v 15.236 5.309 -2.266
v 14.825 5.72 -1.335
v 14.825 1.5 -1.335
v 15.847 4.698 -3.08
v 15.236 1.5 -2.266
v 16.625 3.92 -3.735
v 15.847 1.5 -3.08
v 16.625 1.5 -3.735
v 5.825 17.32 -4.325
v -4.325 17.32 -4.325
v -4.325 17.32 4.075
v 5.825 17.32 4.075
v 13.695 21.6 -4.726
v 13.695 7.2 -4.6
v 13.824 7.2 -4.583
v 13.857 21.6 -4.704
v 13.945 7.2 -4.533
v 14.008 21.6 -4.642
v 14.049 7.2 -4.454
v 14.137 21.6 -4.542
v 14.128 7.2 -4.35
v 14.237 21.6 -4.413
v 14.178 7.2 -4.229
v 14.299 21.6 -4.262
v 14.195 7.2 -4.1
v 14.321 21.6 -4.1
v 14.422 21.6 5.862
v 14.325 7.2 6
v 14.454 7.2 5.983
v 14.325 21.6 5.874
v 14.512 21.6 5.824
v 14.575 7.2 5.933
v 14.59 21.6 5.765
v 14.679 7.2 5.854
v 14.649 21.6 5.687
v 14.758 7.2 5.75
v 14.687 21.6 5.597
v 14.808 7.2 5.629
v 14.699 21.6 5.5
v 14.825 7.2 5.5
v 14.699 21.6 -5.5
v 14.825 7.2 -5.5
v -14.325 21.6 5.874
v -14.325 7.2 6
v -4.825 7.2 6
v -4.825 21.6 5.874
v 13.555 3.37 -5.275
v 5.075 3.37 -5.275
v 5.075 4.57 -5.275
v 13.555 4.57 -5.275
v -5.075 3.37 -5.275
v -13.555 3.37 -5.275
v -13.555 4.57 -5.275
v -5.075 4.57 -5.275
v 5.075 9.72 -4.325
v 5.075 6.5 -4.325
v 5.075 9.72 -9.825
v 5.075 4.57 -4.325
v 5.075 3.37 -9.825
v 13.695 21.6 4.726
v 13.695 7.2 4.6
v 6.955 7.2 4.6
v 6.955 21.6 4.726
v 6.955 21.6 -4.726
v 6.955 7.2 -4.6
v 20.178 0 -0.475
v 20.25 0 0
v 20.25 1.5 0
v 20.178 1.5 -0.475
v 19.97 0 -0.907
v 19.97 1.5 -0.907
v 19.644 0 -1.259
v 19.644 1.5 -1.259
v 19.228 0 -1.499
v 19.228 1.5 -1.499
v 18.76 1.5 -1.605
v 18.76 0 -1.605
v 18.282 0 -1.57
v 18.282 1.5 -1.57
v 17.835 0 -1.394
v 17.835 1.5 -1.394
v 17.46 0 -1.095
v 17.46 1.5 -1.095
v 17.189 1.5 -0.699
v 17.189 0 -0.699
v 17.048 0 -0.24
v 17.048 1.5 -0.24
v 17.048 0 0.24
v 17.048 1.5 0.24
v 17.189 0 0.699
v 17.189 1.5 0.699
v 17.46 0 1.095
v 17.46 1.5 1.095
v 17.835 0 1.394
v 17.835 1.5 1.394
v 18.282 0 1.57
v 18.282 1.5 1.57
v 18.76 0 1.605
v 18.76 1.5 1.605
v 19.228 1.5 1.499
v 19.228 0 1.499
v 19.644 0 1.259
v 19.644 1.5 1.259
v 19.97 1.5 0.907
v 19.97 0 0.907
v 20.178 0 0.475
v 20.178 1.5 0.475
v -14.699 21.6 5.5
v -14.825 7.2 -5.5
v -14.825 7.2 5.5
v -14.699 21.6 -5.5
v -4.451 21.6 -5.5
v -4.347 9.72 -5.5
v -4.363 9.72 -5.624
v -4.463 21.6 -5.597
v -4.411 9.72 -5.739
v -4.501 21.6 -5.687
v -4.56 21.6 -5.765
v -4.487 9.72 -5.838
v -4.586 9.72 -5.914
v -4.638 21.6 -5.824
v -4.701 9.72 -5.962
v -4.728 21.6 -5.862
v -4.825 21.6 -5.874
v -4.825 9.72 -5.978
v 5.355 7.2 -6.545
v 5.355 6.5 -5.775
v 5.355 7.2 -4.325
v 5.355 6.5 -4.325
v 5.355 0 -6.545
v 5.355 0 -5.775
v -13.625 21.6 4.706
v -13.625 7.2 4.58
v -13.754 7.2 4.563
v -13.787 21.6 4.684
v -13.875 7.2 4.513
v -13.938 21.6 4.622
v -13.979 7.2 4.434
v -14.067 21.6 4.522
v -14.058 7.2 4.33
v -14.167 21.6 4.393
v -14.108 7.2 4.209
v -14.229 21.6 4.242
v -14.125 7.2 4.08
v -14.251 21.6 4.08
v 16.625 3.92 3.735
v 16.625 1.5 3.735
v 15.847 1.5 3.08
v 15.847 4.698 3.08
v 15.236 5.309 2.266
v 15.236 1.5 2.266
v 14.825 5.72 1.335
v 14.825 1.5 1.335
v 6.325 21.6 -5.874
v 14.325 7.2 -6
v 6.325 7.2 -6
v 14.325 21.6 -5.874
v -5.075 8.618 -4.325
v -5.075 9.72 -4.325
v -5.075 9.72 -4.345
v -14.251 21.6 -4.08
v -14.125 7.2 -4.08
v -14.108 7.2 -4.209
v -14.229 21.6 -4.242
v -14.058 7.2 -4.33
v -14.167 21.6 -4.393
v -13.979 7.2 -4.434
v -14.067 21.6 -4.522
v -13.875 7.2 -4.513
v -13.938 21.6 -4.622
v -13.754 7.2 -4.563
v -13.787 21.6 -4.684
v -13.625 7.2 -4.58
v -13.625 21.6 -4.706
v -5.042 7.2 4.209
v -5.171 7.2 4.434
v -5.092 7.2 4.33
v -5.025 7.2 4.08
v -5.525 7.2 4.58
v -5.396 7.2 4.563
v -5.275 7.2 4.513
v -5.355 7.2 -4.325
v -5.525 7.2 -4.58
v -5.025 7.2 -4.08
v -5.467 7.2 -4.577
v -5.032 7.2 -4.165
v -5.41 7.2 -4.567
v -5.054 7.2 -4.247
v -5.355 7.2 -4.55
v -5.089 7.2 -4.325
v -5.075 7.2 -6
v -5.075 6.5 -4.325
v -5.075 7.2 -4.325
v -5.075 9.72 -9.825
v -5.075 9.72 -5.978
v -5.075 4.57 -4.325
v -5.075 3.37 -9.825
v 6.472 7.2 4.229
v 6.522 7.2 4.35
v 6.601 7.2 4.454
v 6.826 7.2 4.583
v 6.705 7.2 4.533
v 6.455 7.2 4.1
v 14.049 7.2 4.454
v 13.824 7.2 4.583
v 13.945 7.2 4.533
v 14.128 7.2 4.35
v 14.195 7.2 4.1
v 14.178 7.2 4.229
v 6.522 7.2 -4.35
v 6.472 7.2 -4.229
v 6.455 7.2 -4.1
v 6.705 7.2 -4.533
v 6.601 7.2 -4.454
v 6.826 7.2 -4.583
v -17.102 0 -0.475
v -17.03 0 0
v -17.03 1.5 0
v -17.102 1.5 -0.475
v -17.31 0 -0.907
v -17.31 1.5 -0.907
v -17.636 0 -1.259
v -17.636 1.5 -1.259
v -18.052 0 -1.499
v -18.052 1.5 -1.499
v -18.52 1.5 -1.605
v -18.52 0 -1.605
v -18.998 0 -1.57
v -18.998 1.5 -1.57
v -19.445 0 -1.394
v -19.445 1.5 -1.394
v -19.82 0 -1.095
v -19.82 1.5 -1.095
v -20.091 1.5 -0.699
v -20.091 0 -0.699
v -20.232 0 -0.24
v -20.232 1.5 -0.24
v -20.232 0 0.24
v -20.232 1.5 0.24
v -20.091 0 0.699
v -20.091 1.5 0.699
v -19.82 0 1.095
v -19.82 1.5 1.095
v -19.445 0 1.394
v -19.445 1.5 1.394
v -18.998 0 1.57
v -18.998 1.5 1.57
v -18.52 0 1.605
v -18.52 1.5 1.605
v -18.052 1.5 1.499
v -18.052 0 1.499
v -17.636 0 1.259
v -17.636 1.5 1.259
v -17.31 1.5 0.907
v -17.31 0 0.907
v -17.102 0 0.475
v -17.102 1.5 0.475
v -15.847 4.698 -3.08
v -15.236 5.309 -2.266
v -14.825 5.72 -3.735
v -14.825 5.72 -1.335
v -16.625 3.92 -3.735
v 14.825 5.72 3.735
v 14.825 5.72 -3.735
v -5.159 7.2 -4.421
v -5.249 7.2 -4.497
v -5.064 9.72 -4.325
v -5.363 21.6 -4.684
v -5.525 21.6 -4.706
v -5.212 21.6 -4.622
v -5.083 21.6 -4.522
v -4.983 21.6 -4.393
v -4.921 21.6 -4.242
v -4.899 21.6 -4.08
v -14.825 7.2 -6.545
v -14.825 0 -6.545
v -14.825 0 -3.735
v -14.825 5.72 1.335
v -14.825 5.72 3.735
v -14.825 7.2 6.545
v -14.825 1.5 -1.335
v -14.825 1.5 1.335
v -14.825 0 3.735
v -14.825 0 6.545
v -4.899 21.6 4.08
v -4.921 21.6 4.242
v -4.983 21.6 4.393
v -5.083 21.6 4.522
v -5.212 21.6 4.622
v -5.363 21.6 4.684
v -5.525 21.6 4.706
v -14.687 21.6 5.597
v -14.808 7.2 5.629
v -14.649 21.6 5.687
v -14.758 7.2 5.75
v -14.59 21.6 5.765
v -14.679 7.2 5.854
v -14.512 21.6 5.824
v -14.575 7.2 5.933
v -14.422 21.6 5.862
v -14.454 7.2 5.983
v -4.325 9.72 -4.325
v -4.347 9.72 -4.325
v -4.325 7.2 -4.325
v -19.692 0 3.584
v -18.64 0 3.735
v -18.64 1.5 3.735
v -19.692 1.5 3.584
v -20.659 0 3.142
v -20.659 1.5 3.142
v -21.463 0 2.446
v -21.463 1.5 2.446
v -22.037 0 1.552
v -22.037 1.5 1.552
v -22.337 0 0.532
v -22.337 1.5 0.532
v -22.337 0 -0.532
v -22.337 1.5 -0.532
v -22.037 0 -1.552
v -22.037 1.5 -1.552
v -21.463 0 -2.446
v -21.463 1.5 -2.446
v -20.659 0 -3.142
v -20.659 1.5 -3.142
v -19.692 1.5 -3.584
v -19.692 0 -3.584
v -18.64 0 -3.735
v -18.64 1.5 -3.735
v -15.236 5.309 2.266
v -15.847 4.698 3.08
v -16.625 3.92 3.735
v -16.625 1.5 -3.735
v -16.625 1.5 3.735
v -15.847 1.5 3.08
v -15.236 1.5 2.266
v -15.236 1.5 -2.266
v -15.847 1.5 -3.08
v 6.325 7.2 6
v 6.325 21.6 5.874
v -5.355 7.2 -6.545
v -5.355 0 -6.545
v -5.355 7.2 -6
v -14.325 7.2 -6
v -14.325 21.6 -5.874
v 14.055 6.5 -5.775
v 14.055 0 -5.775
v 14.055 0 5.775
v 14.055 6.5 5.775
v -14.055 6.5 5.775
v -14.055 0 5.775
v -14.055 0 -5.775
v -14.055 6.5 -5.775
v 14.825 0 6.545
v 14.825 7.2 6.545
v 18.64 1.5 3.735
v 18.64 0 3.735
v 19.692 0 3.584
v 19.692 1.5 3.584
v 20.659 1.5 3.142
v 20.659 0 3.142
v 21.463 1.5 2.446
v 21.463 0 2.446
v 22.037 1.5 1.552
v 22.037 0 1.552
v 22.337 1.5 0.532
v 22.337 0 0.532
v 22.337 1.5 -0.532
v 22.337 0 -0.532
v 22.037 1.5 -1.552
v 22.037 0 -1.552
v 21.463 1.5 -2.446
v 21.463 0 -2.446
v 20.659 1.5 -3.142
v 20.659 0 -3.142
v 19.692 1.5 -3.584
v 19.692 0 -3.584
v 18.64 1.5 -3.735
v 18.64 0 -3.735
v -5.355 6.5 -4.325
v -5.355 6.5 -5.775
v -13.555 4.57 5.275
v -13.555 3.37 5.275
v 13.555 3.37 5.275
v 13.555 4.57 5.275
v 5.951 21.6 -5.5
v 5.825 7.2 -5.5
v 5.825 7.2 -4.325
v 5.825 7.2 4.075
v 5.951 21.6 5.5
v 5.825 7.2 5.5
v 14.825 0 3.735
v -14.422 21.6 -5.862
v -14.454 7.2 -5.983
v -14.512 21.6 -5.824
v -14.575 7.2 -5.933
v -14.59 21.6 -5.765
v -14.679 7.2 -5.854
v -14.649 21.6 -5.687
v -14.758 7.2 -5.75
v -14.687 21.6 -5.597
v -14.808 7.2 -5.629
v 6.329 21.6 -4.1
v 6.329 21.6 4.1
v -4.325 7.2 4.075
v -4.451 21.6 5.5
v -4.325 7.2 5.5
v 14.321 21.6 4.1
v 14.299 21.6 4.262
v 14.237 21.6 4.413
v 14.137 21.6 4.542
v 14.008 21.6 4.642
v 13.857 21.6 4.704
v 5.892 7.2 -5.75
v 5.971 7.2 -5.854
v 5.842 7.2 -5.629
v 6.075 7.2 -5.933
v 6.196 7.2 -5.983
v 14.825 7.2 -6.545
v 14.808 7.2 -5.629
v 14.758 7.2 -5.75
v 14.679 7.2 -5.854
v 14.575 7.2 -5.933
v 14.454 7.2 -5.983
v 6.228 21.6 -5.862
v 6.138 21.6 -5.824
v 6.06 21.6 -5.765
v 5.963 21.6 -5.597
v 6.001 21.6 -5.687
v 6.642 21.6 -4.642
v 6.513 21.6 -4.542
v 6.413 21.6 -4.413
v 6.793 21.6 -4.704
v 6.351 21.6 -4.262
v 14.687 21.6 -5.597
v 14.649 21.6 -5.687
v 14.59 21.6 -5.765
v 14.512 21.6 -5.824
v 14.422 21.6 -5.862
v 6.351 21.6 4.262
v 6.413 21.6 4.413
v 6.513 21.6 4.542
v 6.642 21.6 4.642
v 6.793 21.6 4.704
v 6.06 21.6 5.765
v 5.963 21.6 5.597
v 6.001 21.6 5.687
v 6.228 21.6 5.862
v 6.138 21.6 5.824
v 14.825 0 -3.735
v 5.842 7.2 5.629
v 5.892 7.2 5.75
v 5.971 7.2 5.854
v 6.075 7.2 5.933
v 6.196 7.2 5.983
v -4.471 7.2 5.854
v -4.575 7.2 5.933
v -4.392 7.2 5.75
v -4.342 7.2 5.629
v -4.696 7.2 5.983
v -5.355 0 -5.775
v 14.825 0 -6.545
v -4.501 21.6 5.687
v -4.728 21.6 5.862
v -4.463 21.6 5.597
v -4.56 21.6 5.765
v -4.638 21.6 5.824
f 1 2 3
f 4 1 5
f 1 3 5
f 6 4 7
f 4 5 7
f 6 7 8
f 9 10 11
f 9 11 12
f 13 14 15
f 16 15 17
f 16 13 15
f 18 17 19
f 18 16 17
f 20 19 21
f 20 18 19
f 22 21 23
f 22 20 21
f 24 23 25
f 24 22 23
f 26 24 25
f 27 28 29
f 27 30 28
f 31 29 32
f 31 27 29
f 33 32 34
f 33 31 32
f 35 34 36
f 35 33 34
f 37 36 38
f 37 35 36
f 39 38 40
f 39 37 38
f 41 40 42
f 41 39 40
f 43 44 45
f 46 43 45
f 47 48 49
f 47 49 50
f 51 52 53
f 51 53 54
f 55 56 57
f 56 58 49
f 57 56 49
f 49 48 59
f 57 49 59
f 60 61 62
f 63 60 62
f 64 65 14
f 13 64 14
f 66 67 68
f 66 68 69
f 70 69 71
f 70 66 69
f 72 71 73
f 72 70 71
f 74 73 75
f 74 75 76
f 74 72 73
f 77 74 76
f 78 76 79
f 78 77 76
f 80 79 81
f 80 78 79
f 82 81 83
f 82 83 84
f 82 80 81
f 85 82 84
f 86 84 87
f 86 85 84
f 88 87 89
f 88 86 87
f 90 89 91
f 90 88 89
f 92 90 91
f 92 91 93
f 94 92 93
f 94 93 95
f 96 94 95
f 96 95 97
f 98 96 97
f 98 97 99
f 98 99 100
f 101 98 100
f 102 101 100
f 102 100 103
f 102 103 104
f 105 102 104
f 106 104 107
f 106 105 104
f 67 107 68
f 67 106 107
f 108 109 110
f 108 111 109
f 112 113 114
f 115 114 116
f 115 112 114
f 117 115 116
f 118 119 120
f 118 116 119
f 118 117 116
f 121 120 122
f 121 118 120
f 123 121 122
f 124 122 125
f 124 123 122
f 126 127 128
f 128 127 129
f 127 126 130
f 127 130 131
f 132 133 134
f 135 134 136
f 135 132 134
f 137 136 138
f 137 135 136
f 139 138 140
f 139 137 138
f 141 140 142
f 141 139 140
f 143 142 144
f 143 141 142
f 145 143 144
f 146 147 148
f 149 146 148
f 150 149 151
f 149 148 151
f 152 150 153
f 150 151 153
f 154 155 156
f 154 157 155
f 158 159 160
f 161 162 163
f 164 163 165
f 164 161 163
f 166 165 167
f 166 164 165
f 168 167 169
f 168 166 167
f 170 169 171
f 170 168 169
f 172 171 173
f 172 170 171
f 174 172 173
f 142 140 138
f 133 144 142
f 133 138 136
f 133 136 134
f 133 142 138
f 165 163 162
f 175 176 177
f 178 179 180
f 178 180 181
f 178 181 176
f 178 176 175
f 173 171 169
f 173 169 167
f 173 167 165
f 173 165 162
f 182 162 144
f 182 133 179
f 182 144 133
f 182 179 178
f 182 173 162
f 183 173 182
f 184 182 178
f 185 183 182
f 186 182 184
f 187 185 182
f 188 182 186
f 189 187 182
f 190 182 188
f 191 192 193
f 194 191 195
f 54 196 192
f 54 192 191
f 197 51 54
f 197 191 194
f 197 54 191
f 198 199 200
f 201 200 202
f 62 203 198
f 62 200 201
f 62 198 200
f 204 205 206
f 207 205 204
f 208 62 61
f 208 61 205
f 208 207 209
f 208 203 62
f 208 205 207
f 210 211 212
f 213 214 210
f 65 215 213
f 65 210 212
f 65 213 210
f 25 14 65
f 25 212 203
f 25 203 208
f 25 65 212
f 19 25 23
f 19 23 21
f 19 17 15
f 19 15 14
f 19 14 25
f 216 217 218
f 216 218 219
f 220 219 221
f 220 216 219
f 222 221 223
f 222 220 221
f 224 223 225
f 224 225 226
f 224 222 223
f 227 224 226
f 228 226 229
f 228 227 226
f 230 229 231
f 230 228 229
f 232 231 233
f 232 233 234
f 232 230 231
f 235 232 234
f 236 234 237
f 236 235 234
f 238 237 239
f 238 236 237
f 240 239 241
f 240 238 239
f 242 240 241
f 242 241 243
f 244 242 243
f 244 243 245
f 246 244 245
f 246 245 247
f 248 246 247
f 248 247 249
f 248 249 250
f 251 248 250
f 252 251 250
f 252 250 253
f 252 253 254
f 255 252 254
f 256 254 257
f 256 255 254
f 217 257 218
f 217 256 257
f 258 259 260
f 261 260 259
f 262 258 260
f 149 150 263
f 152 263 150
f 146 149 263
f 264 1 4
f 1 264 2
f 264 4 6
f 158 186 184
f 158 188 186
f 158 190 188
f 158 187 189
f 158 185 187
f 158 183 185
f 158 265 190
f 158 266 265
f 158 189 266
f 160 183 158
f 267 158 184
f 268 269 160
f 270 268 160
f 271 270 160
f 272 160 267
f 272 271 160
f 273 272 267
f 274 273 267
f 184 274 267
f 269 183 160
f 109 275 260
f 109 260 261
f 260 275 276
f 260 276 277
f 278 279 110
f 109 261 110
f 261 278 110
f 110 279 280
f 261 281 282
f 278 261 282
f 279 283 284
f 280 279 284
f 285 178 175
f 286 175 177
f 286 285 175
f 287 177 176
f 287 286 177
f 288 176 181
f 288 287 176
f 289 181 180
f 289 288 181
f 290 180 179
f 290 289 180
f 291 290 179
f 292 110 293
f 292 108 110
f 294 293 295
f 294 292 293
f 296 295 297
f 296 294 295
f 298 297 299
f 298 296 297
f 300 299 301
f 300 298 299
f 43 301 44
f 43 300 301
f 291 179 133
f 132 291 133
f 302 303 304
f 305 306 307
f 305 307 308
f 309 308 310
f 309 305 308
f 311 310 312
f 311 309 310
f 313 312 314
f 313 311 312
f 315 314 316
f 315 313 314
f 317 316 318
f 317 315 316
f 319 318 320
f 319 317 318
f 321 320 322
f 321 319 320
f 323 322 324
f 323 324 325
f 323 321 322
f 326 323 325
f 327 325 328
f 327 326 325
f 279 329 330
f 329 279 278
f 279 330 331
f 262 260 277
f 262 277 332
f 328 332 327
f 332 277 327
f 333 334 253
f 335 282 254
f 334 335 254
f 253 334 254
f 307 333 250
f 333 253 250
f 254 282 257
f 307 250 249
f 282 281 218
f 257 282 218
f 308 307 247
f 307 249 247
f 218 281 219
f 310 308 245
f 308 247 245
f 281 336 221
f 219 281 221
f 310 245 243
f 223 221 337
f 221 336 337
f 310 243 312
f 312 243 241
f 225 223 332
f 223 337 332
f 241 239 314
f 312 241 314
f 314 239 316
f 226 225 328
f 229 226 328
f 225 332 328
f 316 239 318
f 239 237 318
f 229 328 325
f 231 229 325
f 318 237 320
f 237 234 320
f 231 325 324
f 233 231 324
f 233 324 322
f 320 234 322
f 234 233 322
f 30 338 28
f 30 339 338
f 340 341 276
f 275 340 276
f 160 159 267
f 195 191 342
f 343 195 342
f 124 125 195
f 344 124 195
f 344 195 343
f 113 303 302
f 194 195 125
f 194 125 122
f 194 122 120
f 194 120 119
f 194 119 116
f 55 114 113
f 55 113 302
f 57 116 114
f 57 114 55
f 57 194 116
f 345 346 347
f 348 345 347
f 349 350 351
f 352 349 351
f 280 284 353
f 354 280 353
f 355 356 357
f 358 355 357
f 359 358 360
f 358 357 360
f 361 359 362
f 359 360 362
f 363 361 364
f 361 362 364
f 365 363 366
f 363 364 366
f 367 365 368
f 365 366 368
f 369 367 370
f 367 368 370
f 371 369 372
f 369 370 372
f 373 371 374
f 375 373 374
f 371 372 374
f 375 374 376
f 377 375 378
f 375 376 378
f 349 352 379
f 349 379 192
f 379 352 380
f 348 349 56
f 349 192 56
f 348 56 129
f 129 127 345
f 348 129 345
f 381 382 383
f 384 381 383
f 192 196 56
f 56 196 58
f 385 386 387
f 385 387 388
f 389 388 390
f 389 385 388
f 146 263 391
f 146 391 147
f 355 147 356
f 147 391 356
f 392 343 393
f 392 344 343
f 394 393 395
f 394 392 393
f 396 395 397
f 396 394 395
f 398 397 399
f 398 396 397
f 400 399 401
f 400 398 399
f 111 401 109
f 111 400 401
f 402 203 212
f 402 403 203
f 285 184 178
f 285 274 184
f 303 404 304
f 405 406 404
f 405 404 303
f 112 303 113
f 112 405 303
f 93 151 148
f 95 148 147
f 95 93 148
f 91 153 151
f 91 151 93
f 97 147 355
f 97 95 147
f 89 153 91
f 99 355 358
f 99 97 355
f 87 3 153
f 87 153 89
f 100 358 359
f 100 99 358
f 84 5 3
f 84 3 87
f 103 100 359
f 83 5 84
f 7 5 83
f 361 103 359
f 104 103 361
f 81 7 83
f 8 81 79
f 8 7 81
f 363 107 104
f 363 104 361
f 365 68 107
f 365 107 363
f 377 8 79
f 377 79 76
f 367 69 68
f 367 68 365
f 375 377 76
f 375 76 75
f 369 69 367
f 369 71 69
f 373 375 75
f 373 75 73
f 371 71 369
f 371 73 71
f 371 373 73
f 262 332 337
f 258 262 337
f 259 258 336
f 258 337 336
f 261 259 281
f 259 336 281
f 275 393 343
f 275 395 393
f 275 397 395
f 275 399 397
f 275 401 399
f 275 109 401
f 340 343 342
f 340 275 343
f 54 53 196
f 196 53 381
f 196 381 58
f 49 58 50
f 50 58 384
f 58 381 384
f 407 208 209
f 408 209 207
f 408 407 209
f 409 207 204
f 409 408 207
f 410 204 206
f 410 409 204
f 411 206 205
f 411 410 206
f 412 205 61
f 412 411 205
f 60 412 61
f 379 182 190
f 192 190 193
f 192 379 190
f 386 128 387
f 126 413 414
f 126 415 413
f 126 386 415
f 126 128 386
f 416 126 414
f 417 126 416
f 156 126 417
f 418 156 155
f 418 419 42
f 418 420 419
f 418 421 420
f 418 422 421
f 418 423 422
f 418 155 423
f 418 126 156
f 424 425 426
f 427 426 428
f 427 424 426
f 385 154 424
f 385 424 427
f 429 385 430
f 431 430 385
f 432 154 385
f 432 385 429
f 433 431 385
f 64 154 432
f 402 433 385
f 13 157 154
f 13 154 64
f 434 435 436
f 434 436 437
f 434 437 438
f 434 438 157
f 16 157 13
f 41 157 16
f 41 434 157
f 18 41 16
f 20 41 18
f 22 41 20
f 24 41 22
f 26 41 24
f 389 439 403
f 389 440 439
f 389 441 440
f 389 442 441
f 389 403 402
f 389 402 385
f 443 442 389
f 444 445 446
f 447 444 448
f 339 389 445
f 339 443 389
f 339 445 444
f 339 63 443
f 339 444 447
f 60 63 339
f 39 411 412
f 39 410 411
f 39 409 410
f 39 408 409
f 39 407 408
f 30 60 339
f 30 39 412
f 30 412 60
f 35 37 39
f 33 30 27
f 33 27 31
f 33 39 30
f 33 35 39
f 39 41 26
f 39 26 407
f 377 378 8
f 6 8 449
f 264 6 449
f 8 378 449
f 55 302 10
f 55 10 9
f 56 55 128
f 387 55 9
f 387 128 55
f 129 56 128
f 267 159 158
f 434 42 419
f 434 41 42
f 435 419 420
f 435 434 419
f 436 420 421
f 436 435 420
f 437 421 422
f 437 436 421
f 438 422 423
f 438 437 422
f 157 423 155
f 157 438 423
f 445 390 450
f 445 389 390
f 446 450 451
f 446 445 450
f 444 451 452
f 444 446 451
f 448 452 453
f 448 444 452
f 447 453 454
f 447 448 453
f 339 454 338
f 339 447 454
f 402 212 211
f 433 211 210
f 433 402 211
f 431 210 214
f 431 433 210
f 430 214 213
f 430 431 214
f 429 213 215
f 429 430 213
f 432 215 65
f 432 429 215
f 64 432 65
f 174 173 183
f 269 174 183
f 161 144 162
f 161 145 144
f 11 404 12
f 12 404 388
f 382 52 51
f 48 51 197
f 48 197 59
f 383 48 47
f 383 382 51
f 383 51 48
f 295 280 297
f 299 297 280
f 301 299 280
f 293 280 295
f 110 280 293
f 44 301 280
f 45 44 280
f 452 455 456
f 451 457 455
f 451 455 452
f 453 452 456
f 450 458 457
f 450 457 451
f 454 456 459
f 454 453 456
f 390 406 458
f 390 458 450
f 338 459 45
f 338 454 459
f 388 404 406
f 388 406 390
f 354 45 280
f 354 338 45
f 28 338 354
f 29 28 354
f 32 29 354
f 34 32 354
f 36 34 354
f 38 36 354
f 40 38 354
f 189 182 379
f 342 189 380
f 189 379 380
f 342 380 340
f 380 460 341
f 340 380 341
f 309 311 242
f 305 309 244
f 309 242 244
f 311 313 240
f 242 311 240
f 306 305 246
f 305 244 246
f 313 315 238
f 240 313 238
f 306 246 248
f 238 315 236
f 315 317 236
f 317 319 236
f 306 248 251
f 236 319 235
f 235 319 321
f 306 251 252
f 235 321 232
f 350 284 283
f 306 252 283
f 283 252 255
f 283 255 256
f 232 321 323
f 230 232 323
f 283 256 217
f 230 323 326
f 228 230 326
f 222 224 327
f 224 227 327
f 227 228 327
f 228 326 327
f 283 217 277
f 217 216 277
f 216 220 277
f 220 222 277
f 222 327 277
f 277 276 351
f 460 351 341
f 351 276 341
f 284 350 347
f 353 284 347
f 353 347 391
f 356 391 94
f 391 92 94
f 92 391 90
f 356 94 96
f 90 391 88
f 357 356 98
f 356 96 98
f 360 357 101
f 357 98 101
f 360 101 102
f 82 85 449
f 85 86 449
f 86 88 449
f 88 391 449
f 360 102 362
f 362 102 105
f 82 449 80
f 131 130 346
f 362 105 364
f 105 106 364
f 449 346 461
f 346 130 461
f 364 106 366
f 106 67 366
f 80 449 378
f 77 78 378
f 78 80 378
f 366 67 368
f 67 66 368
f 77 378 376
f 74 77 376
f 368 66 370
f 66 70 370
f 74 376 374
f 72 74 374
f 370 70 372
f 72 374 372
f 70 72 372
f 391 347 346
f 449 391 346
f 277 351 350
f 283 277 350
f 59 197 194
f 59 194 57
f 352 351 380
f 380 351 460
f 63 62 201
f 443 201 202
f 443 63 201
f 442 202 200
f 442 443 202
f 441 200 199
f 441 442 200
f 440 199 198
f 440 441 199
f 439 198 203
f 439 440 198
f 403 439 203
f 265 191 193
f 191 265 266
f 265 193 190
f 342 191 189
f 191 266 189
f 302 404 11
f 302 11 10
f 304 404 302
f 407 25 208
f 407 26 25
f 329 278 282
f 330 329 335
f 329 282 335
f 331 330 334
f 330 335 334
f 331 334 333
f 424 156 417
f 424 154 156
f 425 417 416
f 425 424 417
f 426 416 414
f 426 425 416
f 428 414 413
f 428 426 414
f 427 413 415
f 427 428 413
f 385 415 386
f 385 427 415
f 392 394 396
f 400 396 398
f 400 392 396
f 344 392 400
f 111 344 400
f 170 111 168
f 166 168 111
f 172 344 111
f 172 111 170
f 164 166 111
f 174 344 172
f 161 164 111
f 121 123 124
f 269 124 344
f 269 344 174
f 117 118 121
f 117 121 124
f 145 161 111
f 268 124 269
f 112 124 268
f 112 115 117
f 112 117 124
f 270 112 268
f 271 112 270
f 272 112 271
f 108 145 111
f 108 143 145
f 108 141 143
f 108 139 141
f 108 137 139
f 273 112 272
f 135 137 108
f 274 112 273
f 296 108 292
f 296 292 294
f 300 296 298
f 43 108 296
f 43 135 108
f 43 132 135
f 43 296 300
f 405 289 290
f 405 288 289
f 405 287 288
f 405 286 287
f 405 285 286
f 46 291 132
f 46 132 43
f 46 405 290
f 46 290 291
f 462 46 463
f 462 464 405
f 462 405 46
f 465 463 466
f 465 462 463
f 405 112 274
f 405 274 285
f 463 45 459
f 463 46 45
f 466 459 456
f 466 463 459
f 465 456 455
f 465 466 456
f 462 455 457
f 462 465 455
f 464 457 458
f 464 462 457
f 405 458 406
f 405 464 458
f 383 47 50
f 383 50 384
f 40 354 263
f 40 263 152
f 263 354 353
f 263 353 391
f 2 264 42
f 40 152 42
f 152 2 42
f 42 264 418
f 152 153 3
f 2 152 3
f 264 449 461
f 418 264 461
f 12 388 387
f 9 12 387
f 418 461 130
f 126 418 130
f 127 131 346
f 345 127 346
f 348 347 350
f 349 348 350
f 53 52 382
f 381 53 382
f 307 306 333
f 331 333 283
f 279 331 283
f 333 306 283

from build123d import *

# Parameters (mm, degrees)
BOSS_EXTRUDE1_DEPTH     = 7.2
SKETCH2_R               = 1.61
BOSS_EXTRUDE2_DEPTH     = 1.5
BOSS_EXTRUDE3_DEPTH     = 0.7
BOSS_EXTRUDE4_DEPTH     = 14.4
BOSS_EXTRUDE4_TAPER     = 0.5
SKETCH5_W               = 10.15
SKETCH5_H               = 8.4
BOSS_EXTRUDE5_DEPTH     = 10.12
SKETCH6_W               = 10.15
SKETCH6_H               = 5.5
BOSS_EXTRUDE6_DEPTH     = 6.35
BOSS_EXTRUDE7_DEPTH     = 4.22
CUT_EXTRUDE1_DEPTH      = 7.544999991
CUT_EXTRUDE1_DEPTH_BACK = 10.824999991
SKETCH9_W               = 27.11
SKETCH9_H               = 10.549999982
BOSS_EXTRUDE8_DEPTH     = 1.2


with BuildPart() as part:
    # Sketch1 → Boss-Extrude1 (new body)
    with BuildSketch(Plane(origin=(0, 0, 0), x_dir=(1, 0, 0), z_dir=(0, 1, 0))):
        Polygon((-14.055, 5.774999991), (-5.355, 5.774999991), (-5.355, 6.544999991), (-14.825, 6.544999991), (-14.825, -6.544999991), (14.825, -6.544999991), (14.825, 6.544999991), (5.355, 6.544999991), (5.355, 5.774999991), (14.055, 5.774999991), (14.055, -5.774999991), (-14.055, -5.774999991), align=None)
    extrude(amount=BOSS_EXTRUDE1_DEPTH)

    # Sketch2 → Boss-Extrude2 (add)
    with BuildSketch(Plane(origin=(0, 0, 0), x_dir=(1, 0, 0), z_dir=(0, 1, 0))):
        with BuildLine():
            Line((18.64, 3.735), (14.825, 3.735))
            Line((14.825, 3.735), (14.825, -3.735))
            Line((14.825, -3.735), (18.64, -3.735))
            ThreePointArc((18.64, -3.735), (22.375, 0), (18.64, 3.735))
        make_face()
        with Locations((18.64, 0)):
            Circle(SKETCH2_R, mode=Mode.SUBTRACT)
        with BuildLine():
            Line((-14.825, 3.735), (-14.825, -3.735))
            Line((-14.825, -3.735), (-18.64, -3.735))
            ThreePointArc((-18.64, -3.735), (-22.375, 0), (-18.64, 3.735))
            Line((-18.64, 3.735), (-14.825, 3.735))
        make_face()
        with Locations((-18.64, 0)):
            Circle(SKETCH2_R, mode=Mode.SUBTRACT)
    extrude(amount=BOSS_EXTRUDE2_DEPTH)

    # Sketch3 → Boss-Extrude3 (add)
    with BuildSketch(Plane(origin=(0, 7.2, 0), x_dir=(1, 0, 0), z_dir=(0, 1, 0))):
        Polygon((-14.825, -6.544999991), (14.825, -6.544999991), (14.825, 6.544999991), (5.355, 6.544999991), (5.355, 4.324999991), (-5.355, 4.324999991), (-5.355, 6.544999991), (-14.825, 6.544999991), align=None)
    extrude(amount=-BOSS_EXTRUDE3_DEPTH)

    # Sketch4 → Boss-Extrude4 (add)
    with BuildSketch(Plane(origin=(0, 7.2, 0), x_dir=(1, 0, 0), z_dir=(0, 1, 0))):
        with BuildLine():
            Line((-14.325, -6), (-4.825, -6))
            ThreePointArc((-4.825, -6), (-4.471446609, -5.853553391), (-4.325, -5.5))
            Line((-4.325, -5.5), (-4.325, 5.5))
            ThreePointArc((-4.325, 5.5), (-4.471446609, 5.853553391), (-4.825, 6))
            Line((-4.825, 6), (-14.325, 6))
            ThreePointArc((-14.325, 6), (-14.678553391, 5.853553391), (-14.825, 5.5))
            Line((-14.825, 5.5), (-14.825, -5.5))
            ThreePointArc((-14.825, -5.5), (-14.678553391, -5.853553391), (-14.325, -6))
        make_face()
        with BuildLine():
            Line((-13.625, -4.58), (-5.525, -4.58))
            ThreePointArc((-5.525, -4.58), (-5.171446609, -4.433553391), (-5.025, -4.08))
            Line((-5.025, -4.08), (-5.025, 4.08))
            ThreePointArc((-5.025, 4.08), (-5.171446609, 4.433553391), (-5.525, 4.58))
            Line((-5.525, 4.58), (-13.625, 4.58))
            ThreePointArc((-13.625, 4.58), (-13.978553391, 4.433553391), (-14.125, 4.08))
            Line((-14.125, 4.08), (-14.125, -4.08))
            ThreePointArc((-14.125, -4.08), (-13.978553391, -4.433553391), (-13.625, -4.58))
        make_face(mode=Mode.SUBTRACT)
        with BuildLine():
            Line((6.325, -6), (14.325, -6))
            ThreePointArc((14.325, -6), (14.678553391, -5.853553391), (14.825, -5.5))
            Line((14.825, -5.5), (14.825, 5.5))
            ThreePointArc((14.825, 5.5), (14.678553391, 5.853553391), (14.325, 6))
            Line((14.325, 6), (6.325, 6))
            ThreePointArc((6.325, 6), (5.971446609, 5.853553391), (5.825, 5.5))
            Line((5.825, 5.5), (5.825, -5.5))
            ThreePointArc((5.825, -5.5), (5.971446609, -5.853553391), (6.325, -6))
        make_face()
        with BuildLine():
            Line((6.955, -4.6), (13.695, -4.6))
            ThreePointArc((13.695, -4.6), (14.048553391, -4.453553391), (14.195, -4.1))
            Line((14.195, -4.1), (14.195, 4.1))
            ThreePointArc((14.195, 4.1), (14.048553391, 4.453553391), (13.695, 4.6))
            Line((13.695, 4.6), (6.955, 4.6))
            ThreePointArc((6.955, 4.6), (6.601446609, 4.453553391), (6.455, 4.1))
            Line((6.455, 4.1), (6.455, -4.1))
            ThreePointArc((6.455, -4.1), (6.601446609, -4.453553391), (6.955, -4.6))
        make_face(mode=Mode.SUBTRACT)
    extrude(amount=BOSS_EXTRUDE4_DEPTH, taper=BOSS_EXTRUDE4_TAPER)

    # Sketch5 → Boss-Extrude5 (add)
    with BuildSketch(Plane(origin=(0, 7.2, 0), x_dir=(1, 0, 0), z_dir=(0, 1, 0))):
        with Locations((0.75, 0.124999991)):
            Rectangle(SKETCH5_W, SKETCH5_H)
    extrude(amount=BOSS_EXTRUDE5_DEPTH)

    # Sketch6 → Boss-Extrude6 (add)
    with BuildSketch(Plane(origin=(0, 3.37, 0), x_dir=(1, 0, 0), z_dir=(0, 1, 0))):
        with Locations((0, 7.074999991)):
            Rectangle(SKETCH6_W, SKETCH6_H)
    extrude(amount=BOSS_EXTRUDE6_DEPTH)

    # Sketch7 → Boss-Extrude7 (add)
    with BuildSketch(Plane(origin=(0, 1.5, 0), x_dir=(1, 0, 0), z_dir=(0, 1, 0))):
        with BuildLine():
            Line((-14.825, 3.735), (-16.625, 3.735))
            ThreePointArc((-16.625, 3.735), (-15.518302355, 2.690023234), (-14.825, 1.335))
            Line((-14.825, 1.335), (-14.825, 3.735))
        make_face()
        with BuildLine():
            Line((-14.825, -3.735), (-14.825, -1.335))
            ThreePointArc((-14.825, -1.335), (-15.518302355, -2.690023234), (-16.625, -3.735))
            Line((-16.625, -3.735), (-14.825, -3.735))
        make_face()
        with BuildLine():
            Line((14.825, -3.735), (16.625, -3.735))
            ThreePointArc((16.625, -3.735), (15.518302355, -2.690023234), (14.825, -1.335))
            Line((14.825, -1.335), (14.825, -3.735))
        make_face()
        with BuildLine():
            Line((14.825, 3.735), (14.825, 1.335))
            ThreePointArc((14.825, 1.335), (15.518302355, 2.690023234), (16.625, 3.735))
            Line((16.625, 3.735), (14.825, 3.735))
        make_face()
    extrude(amount=BOSS_EXTRUDE7_DEPTH)

    # Sketch8 → Cut-Extrude1 (cut, two sides)
    with BuildSketch(Plane.XY) as cut_extrude1_sk:
        Polygon((-14.825, 5.72), (-16.625, 3.92), (-16.625, 5.72), align=None)
        Polygon((14.825, 5.72), (16.625, 3.92), (16.625, 5.72), align=None)
    extrude(amount=CUT_EXTRUDE1_DEPTH, mode=Mode.SUBTRACT)
    extrude(cut_extrude1_sk.sketch, amount=-CUT_EXTRUDE1_DEPTH_BACK, mode=Mode.SUBTRACT)

    # Sketch9 → Boss-Extrude8 (add)
    with BuildSketch(Plane.XZ.offset(-3.37)):
        Rectangle(SKETCH9_W, SKETCH9_H)
    extrude(amount=-BOSS_EXTRUDE8_DEPTH)


solid = part.part
